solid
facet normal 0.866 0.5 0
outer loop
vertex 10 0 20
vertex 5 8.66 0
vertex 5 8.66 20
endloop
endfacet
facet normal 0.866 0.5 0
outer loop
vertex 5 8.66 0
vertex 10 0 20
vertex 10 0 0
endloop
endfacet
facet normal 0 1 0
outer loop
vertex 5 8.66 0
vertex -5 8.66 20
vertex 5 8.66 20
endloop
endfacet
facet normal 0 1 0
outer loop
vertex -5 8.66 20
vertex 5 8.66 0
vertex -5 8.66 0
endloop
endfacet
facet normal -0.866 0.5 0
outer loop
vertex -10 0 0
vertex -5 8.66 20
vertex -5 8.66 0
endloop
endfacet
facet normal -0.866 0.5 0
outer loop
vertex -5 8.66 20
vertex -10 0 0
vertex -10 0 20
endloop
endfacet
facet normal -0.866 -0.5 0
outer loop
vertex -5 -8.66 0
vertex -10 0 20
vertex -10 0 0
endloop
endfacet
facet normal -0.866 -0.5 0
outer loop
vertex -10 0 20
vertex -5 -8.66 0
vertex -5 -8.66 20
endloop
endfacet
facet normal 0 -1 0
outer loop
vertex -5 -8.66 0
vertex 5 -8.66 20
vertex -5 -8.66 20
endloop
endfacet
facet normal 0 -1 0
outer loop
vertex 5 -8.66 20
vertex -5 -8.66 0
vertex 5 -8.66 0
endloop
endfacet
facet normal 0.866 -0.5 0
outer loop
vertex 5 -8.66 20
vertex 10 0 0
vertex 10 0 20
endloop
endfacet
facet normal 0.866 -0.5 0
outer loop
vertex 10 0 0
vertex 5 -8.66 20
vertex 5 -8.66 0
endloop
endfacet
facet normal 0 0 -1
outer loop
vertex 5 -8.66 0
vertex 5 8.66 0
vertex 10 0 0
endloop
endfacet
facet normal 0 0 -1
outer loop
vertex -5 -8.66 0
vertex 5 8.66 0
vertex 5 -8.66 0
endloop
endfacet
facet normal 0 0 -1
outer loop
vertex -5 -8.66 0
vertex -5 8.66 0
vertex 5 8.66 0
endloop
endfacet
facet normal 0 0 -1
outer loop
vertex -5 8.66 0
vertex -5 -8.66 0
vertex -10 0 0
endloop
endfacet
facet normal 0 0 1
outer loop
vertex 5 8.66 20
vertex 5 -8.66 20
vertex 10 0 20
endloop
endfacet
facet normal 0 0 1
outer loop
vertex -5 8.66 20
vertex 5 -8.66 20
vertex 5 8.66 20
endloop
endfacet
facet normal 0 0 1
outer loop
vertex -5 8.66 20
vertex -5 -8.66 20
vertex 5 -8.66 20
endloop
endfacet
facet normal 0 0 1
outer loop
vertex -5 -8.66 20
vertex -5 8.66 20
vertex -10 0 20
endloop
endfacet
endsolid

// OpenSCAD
// Auto-generated from tests/data/feature_fixtures_manifest.json
// fixture: negative_hex_prism
// fixture_type: prism
// description: Hexagonal prism: negative-class for cylinder over-detection, positive-class for linear_extrude_solid (Phase 3).
$fn = 96;

radius = 10.000000;
height = 20.000000;
sides = 6;

cylinder(r=radius, h=height, $fn=sides);
